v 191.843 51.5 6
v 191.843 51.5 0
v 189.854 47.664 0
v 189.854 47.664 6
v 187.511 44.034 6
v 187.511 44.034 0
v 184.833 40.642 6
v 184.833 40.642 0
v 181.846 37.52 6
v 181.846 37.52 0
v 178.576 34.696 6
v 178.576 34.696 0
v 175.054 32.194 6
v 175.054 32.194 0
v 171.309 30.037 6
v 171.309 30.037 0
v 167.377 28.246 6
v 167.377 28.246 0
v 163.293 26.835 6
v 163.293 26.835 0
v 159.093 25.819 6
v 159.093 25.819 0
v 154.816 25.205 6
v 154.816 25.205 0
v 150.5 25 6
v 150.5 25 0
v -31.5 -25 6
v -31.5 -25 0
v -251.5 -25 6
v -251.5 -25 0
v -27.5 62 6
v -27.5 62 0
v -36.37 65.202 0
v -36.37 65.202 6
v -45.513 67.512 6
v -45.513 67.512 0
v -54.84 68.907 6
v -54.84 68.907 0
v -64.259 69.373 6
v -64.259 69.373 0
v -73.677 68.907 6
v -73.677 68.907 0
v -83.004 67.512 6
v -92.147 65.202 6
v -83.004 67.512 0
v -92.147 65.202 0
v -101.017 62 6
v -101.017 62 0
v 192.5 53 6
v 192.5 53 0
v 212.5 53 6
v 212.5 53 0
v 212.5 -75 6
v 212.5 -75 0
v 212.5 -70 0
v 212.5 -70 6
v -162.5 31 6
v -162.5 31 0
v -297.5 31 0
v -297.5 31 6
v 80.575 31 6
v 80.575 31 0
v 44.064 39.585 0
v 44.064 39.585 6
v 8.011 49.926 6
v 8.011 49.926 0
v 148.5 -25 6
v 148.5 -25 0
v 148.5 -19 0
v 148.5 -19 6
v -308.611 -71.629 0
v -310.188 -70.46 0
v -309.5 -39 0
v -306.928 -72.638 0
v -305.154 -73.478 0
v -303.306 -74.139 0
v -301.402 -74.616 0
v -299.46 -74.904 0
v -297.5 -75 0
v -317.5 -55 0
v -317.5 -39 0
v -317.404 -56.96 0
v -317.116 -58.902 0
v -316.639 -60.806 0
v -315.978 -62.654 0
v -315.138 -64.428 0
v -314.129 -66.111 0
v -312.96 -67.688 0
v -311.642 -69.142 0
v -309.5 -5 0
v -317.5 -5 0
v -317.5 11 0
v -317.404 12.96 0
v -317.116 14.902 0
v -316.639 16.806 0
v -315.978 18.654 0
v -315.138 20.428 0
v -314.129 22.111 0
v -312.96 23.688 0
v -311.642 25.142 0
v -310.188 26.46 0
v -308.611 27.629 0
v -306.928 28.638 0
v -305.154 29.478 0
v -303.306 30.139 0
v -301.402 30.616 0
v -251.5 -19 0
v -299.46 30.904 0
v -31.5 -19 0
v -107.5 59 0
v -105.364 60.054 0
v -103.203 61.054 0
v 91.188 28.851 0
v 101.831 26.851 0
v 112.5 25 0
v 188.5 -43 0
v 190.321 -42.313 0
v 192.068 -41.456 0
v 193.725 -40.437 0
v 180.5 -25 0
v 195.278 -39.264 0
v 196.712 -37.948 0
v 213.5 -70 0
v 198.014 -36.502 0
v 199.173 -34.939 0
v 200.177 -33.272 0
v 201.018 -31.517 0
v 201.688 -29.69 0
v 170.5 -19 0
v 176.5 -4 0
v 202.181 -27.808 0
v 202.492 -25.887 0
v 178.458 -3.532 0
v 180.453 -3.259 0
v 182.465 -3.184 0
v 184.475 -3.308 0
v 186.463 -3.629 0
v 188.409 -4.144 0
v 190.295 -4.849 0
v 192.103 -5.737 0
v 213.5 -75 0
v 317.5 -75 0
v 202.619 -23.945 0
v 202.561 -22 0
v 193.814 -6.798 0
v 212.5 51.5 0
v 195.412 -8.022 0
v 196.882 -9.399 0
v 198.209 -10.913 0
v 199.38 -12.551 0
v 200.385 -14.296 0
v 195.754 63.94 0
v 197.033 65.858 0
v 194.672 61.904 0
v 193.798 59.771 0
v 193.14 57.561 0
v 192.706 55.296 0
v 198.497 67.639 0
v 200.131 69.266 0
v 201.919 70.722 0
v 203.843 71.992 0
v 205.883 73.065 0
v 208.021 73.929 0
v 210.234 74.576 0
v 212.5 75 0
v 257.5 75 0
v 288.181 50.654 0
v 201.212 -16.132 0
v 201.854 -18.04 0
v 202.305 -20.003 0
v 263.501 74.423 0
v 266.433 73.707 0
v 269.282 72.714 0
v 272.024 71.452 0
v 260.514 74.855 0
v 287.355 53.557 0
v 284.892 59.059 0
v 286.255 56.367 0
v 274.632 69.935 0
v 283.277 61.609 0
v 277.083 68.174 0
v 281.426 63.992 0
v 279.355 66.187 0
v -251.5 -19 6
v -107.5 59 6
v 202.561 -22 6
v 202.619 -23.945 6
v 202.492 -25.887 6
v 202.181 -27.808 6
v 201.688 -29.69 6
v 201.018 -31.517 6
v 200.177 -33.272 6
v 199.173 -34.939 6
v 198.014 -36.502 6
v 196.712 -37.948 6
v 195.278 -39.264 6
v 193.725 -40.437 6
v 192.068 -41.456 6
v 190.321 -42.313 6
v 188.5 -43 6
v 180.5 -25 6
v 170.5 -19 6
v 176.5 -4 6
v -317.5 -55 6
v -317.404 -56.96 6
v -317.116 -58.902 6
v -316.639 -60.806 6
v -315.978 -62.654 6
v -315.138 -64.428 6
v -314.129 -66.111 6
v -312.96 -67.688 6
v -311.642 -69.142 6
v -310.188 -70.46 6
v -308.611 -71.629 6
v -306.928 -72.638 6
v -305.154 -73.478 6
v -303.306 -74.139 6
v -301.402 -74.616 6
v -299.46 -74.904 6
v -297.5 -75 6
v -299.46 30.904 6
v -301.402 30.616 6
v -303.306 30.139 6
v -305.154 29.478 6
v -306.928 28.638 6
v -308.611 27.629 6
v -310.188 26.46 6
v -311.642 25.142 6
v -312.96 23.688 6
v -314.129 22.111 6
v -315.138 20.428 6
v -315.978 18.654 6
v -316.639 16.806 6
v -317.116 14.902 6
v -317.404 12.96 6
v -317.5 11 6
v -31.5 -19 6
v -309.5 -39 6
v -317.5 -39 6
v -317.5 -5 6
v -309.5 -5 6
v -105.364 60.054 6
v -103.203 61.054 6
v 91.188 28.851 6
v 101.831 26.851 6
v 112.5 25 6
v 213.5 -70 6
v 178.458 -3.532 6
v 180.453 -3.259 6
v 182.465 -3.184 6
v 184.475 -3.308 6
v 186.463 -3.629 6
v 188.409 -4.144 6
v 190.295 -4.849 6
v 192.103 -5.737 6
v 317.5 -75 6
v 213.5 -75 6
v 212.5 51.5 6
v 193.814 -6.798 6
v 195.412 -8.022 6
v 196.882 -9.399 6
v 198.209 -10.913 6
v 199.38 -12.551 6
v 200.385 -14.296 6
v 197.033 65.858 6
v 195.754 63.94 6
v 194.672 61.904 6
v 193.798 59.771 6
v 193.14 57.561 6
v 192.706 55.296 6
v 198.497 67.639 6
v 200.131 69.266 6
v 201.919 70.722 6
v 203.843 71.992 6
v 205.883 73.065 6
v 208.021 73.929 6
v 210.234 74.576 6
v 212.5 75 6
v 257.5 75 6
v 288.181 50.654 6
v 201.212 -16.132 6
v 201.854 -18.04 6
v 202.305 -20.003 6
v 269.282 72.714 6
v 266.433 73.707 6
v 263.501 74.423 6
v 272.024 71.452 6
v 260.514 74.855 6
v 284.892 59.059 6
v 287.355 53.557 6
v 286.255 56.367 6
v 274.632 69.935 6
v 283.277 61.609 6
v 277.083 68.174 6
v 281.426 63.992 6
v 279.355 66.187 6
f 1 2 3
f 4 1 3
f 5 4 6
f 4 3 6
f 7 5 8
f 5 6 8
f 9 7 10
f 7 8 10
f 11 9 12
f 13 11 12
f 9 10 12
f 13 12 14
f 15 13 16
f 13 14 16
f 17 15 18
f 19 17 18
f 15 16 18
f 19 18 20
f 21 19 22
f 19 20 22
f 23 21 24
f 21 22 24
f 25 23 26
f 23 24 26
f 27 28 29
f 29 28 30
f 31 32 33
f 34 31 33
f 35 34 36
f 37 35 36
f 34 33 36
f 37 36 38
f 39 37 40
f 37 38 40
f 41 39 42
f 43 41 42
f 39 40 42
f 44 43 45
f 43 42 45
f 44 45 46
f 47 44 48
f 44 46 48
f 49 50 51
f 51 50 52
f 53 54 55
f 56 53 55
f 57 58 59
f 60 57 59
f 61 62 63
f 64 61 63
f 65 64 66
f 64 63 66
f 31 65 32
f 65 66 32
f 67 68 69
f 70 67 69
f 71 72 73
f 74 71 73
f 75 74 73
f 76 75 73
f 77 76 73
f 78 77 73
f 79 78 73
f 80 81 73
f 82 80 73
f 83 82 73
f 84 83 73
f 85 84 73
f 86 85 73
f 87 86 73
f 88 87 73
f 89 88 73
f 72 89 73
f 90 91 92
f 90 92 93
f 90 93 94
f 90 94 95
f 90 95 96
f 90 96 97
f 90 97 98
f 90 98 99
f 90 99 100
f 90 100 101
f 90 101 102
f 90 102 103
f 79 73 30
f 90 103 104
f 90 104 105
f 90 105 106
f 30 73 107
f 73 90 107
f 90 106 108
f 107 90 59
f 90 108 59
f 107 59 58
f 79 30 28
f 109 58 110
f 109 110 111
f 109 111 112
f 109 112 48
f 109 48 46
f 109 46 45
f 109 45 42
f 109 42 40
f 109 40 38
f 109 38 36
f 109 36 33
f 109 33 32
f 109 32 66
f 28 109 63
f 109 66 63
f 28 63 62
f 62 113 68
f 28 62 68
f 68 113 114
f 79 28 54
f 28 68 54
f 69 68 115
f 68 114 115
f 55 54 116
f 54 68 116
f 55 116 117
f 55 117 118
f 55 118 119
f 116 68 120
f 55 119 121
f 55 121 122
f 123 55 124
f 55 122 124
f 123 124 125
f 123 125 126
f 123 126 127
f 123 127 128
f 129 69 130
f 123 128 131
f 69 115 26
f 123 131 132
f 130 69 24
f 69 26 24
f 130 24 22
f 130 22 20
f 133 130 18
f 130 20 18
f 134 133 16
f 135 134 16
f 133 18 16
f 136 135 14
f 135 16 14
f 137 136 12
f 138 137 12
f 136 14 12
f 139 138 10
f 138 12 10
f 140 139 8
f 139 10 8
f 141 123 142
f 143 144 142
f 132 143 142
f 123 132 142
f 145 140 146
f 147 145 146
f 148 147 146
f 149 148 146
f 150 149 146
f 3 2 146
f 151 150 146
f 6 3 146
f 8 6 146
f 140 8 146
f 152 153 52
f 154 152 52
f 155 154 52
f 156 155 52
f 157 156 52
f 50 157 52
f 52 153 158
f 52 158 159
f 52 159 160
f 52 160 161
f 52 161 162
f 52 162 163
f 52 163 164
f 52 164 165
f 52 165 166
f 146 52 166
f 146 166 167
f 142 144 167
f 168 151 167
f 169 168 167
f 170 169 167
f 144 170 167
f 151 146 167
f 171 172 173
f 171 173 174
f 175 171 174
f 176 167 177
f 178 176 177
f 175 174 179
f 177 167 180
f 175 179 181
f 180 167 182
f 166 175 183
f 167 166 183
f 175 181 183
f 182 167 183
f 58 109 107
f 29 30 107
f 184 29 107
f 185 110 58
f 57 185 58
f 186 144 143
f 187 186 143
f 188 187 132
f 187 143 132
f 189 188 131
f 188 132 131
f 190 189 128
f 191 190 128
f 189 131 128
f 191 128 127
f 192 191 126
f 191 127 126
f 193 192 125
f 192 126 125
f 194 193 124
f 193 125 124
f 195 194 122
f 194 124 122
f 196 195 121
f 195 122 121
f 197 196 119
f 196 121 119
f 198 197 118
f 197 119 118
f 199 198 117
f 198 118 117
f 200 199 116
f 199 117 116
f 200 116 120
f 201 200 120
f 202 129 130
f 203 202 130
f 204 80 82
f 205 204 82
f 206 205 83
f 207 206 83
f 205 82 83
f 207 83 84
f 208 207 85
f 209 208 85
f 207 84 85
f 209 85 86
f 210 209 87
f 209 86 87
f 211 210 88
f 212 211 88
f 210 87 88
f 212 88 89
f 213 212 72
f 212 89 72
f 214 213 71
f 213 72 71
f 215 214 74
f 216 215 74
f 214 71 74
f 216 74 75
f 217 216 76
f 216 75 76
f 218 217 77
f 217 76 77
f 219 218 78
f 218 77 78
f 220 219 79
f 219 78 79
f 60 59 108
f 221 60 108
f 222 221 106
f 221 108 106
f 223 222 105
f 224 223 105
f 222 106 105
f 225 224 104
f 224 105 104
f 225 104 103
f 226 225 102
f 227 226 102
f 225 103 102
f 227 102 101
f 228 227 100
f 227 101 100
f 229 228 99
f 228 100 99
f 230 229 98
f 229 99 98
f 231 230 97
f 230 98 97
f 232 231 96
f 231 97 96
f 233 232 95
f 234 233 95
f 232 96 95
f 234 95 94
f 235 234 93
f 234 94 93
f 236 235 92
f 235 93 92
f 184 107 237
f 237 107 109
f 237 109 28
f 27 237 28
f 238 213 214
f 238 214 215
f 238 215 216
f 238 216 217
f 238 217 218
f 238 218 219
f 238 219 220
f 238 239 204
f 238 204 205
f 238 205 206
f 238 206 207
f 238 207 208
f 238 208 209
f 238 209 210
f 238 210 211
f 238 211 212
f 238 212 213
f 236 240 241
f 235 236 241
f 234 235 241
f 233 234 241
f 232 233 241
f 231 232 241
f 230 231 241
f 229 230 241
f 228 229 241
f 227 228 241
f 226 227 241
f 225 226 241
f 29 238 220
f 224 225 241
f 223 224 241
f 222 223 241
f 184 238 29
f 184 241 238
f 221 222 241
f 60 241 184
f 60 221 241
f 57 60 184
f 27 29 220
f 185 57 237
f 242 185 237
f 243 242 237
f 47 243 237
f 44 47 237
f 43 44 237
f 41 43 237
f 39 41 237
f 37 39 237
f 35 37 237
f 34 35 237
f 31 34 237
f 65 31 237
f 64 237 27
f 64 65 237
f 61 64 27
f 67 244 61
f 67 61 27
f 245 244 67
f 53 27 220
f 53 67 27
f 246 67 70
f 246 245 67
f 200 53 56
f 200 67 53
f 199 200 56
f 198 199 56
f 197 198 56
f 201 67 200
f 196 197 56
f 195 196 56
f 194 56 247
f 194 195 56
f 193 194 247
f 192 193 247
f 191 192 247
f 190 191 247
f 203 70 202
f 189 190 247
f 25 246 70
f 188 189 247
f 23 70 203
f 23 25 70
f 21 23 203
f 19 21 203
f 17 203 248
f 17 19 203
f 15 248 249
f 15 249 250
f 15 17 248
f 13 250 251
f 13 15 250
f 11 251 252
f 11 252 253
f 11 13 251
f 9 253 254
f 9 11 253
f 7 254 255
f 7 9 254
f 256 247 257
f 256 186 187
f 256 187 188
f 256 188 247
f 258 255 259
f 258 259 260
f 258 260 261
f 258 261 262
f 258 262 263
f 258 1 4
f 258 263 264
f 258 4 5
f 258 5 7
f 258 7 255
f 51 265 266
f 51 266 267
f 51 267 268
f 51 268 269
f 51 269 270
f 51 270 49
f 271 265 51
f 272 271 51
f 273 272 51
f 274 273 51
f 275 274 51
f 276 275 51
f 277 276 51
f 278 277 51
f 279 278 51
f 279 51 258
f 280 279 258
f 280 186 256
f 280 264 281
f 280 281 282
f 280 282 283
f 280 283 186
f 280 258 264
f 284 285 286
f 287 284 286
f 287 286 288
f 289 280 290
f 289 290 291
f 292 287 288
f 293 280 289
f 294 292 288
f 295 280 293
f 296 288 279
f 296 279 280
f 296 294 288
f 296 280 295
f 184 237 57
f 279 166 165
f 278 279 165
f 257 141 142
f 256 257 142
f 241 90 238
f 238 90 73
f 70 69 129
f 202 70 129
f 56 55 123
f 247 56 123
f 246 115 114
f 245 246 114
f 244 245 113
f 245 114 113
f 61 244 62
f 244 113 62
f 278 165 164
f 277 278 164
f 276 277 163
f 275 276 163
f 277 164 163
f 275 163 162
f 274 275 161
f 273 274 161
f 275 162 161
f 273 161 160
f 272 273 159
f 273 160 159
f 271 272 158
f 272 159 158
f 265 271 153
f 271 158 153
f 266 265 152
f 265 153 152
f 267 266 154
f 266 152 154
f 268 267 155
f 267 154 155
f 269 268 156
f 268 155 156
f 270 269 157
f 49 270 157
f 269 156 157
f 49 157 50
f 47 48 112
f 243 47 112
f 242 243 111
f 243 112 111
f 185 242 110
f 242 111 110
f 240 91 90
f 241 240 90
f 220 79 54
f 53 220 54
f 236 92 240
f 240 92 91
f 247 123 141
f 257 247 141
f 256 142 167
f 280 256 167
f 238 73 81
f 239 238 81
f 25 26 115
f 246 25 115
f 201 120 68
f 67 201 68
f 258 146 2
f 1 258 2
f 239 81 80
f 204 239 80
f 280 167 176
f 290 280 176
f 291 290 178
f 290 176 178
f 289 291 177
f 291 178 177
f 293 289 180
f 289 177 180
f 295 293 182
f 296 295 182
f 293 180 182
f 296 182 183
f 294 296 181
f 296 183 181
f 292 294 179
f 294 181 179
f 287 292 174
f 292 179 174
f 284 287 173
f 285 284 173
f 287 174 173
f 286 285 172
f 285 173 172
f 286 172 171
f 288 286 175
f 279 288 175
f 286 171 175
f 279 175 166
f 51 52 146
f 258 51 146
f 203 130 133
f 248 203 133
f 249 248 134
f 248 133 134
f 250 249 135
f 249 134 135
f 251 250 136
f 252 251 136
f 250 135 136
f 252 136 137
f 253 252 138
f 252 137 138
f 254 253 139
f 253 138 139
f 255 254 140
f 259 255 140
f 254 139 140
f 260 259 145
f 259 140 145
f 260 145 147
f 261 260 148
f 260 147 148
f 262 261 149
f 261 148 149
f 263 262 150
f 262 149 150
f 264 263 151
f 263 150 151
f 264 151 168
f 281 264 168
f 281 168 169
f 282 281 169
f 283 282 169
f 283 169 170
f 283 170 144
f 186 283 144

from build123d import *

# Parameters (mm, degrees)
F1_DEPTH = 6


with BuildPart() as f1:
    # F0 (on Top) → F1 (new body)
    with BuildSketch(Plane.XY):
        Polygon((-297.5, -55), (-297.5, -75), (-162.5, -75), (-162.5, -25), (-251.5, -25), (-251.5, -22), (-309.5, -22), (-309.5, -39), (-317.5, -39), (-317.5, -55), align=None)
        with BuildLine():
            ThreePointArc((-317.5, -55), (-311.6421356237, -69.1421356237), (-297.5, -75))
            Line((-297.5, -75), (-297.5, -55))
            Line((-297.5, -55), (-317.5, -55))
        make_face()
        with BuildLine():
            Line((-162.5, -25), (-162.5, -75))
            Line((-162.5, -75), (212.5, -75))
            Line((212.5, -75), (212.5, -70))
            Line((212.5, -70), (212.5, -22))
            Line((212.5, -22), (202.5606023011, -22))
            ThreePointArc((202.5606023011, -22), (199.1728742742, -34.9388939069), (188.5, -43))
            Line((188.5, -43), (180.5, -43))
            Line((180.5, -43), (180.5, -25))
            Line((180.5, -25), (148.5, -25))
            Line((148.5, -25), (148.5, -22))
            Line((148.5, -22), (-31.5, -22))
            Line((-31.5, -22), (-31.5, -25))
            Line((-31.5, -25), (-162.5, -25))
        make_face()
        with BuildLine():
            Line((213.5, -70), (213.5, -75))
            Line((213.5, -75), (317.5, -75))
            Line((317.5, -75), (288.1807403902, 50.6539697565))
            ThreePointArc((288.1807403902, 50.6539697565), (277.083392323, 68.1740192438), (257.5, 75))
            Line((257.5, 75), (212.5, 75))
            Line((212.5, 75), (212.5, 53))
            Line((212.5, 53), (212.5, 51.5))
            Line((212.5, 51.5), (212.5, -22))
            Line((212.5, -22), (212.5, -70))
            Line((212.5, -70), (213.5, -70))
        make_face()
        Polygon((-317.5, 11), (-317.5, -5), (-309.5, -5), (-309.5, -22), (-251.5, -22), (-251.5, -19), (-162.5, -19), (-162.5, 31), (-297.5, 31), (-297.5, 11), align=None)
        with BuildLine():
            Line((202.5606023011, -22), (212.5, -22))
            Line((212.5, -22), (212.5, 51.5))
            Line((212.5, 51.5), (191.8430768086, 51.5))
            ThreePointArc((191.8430768086, 51.5), (175.0535129869, 32.1936689306), (150.5, 25))
            Line((150.5, 25), (112.5, 25))
            Line((112.5, 25), (-107.5, 25))
            Line((-107.5, 25), (-107.5, 31))
            Line((-107.5, 31), (-162.5, 31))
            Line((-162.5, 31), (-162.5, -19))
            Line((-162.5, -19), (-31.5, -19))
            Line((-31.5, -19), (-31.5, -22))
            Line((-31.5, -22), (148.5, -22))
            Line((148.5, -22), (148.5, -19))
            Line((148.5, -19), (170.5, -19))
            Line((170.5, -19), (170.5, -4))
            Line((170.5, -4), (176.5, -4))
            ThreePointArc((176.5, -4), (193.8141294499, -6.7978252425), (202.5606023011, -22))
        make_face()
        with BuildLine():
            ThreePointArc((-297.5, 31), (-311.6421356237, 25.1421356237), (-317.5, 11))
            Line((-317.5, 11), (-297.5, 11))
            Line((-297.5, 11), (-297.5, 31))
        make_face()
        Polygon((-107.5, 59), (-162.5, 31), (-107.5, 31), align=None)
        with BuildLine():
            Line((192.5, 53), (212.5, 53))
            Line((212.5, 53), (212.5, 75))
            ThreePointArc((212.5, 75), (198.4968622639, 67.6392161237), (192.5, 53))
        make_face()
        Polygon((180.5, -43), (188.5, -43), (180.5, -25), align=None)
        Polygon((170.5, -19), (176.5, -4), (170.5, -4), align=None)
        with BuildLine():
            Line((-107.5, 59), (-107.5, 31))
            Line((-107.5, 31), (80.5750319553, 31))
            ThreePointArc((80.5750319553, 31), (25.9745832288, 44.5374524252), (-27.5, 62))
            Line((-27.5, 62), (-27.5, 59))
            Line((-27.5, 59), (-107.5, 59))
        make_face()
        with BuildLine():
            Line((80.5750319553, 31), (-107.5, 31))
            Line((-107.5, 31), (-107.5, 25))
            Line((-107.5, 25), (112.5, 25))
            ThreePointArc((112.5, 25), (96.5060750704, 27.8327083402), (80.5750319553, 31))
        make_face()
        with BuildLine():
            ThreePointArc((-101.0171084337, 62), (-104.2866693361, 60.5607557565), (-107.5, 59))
            Line((-107.5, 59), (-27.5, 59))
            Line((-27.5, 59), (-27.5, 62))
            Line((-27.5, 62), (-101.0171084337, 62))
        make_face()
        with BuildLine():
            ThreePointArc((-27.5, 62), (-64.2585542169, 69.3734629996), (-101.0171084337, 62))
            Line((-101.0171084337, 62), (-27.5, 62))
        make_face()
    extrude(amount=F1_DEPTH)


solid = f1.part
